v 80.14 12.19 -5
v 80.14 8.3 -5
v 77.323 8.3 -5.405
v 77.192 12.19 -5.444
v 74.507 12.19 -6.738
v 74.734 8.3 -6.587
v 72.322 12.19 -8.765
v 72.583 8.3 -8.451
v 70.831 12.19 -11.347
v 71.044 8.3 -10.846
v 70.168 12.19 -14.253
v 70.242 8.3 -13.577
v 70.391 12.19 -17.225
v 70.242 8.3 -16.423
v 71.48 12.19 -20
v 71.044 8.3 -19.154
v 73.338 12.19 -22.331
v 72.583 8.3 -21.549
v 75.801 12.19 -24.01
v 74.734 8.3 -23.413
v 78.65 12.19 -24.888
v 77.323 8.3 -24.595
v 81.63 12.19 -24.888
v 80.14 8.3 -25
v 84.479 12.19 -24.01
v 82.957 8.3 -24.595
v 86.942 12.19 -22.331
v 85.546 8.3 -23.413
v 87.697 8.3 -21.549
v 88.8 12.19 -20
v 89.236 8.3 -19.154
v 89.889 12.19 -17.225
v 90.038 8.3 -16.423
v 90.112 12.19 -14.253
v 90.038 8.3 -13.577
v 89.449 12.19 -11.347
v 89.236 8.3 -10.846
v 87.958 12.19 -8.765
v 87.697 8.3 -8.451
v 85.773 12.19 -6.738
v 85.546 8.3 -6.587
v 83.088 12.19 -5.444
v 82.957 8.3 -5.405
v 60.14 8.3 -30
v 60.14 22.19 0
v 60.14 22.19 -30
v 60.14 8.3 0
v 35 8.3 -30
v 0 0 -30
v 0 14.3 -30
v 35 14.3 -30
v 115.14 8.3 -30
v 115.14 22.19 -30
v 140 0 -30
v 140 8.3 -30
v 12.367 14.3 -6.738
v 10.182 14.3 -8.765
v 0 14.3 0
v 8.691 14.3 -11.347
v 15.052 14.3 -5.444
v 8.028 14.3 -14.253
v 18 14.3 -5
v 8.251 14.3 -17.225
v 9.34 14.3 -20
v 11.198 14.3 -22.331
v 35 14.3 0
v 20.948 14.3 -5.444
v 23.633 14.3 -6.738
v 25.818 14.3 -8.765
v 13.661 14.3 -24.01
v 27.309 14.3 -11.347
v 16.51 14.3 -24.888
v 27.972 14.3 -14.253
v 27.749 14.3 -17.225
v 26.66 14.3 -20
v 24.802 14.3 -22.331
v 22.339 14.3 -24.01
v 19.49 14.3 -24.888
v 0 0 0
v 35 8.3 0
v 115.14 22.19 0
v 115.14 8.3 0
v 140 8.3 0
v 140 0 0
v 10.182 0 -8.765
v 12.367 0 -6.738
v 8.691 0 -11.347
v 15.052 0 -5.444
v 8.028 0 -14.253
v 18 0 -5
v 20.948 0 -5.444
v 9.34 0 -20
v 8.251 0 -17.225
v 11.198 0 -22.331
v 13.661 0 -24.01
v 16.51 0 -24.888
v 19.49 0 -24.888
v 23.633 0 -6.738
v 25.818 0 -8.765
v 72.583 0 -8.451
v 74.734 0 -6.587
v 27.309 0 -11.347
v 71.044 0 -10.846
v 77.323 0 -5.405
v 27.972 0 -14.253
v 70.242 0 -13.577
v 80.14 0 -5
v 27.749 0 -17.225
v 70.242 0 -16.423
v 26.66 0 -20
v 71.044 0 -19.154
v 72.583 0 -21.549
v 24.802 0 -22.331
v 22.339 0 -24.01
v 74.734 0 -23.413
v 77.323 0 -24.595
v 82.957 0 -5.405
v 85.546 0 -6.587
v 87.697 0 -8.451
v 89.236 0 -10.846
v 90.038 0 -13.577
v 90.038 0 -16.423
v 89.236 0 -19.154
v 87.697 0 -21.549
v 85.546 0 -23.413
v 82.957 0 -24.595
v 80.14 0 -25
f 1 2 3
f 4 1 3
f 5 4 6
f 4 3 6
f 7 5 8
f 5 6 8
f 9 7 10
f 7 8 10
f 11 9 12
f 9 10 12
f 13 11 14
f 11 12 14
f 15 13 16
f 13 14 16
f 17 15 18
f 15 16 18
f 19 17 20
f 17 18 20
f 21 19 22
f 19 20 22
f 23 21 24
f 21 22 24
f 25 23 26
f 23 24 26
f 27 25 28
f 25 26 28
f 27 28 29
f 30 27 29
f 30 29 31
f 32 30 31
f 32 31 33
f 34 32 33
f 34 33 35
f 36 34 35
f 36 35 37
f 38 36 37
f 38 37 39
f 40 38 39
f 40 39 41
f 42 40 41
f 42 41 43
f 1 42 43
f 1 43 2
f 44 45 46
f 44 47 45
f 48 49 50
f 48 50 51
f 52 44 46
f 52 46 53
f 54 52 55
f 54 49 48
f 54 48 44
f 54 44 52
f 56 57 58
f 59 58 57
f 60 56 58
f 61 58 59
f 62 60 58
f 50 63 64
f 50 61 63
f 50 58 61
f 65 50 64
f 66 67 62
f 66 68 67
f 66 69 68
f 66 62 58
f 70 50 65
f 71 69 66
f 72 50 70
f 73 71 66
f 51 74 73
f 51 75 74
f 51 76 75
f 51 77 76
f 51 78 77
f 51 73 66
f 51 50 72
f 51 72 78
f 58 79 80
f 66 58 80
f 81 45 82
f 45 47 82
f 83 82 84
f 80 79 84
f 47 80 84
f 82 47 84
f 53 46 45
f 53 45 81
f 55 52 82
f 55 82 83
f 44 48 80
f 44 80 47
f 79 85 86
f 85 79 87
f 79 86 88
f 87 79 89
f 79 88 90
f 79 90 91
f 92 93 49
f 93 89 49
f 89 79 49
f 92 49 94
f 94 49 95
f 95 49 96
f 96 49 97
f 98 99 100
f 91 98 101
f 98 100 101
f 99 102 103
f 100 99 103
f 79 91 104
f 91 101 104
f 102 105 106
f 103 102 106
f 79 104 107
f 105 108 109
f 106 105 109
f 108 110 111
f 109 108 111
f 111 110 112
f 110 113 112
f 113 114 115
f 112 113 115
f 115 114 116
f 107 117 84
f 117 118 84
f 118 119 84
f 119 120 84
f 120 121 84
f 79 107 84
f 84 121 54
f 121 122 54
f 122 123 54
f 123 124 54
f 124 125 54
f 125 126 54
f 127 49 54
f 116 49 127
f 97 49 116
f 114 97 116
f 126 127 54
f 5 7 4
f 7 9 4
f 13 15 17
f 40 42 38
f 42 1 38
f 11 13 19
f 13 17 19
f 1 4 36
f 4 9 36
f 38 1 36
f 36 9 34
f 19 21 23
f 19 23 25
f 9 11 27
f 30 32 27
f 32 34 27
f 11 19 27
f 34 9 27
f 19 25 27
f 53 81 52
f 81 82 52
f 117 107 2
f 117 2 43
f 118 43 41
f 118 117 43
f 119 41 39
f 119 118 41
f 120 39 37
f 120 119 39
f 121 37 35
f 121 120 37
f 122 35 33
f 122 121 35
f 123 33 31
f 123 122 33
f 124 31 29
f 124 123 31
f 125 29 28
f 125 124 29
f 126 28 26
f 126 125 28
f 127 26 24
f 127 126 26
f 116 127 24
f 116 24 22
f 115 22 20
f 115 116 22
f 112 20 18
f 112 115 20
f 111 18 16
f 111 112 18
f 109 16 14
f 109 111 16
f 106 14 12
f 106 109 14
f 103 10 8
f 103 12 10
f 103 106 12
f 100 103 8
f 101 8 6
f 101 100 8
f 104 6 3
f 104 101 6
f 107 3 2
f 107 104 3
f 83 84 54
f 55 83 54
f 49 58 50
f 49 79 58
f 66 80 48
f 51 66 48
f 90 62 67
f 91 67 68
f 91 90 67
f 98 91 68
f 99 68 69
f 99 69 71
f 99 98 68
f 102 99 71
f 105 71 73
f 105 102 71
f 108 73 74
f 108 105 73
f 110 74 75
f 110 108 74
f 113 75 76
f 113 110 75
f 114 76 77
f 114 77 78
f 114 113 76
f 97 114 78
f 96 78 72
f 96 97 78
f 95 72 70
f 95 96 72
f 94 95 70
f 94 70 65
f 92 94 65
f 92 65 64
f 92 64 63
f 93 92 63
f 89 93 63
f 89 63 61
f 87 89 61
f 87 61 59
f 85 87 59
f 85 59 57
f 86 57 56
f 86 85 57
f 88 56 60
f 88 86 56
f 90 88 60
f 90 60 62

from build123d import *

# Parameters (mm, degrees)
SKETCH1_W               = 140
SKETCH1_H               = 30
BOSS_EXTRUDE1_DEPTH     = 8.3
SKETCH3_W               = 35
SKETCH3_H               = 30
BOSS_EXTRUDE2_DEPTH     = 6
CUT_EXTRUDE1_DEPTH      = 6
CUT_EXTRUDE1_DEPTH_BACK = 8.3
SKETCH2_R               = 10
SKETCH4_W               = 55
SKETCH4_H               = 30
BOSS_EXTRUDE3_DEPTH     = 3.89
SKETCH5_R               = 10
CUT_EXTRUDE2_DEPTH      = 144.890548682
SKETCH7_W               = 55
SKETCH7_H               = 30
BOSS_EXTRUDE4_DEPTH     = 10


with BuildPart() as part:
    # Sketch1 → Boss-Extrude1 (new body)
    with BuildSketch(Plane(origin=(0, 0, 0), x_dir=(1, 0, 0), z_dir=(0, 1, 0))):
        with Locations((70, 15)):
            Rectangle(SKETCH1_W, SKETCH1_H)
    extrude(amount=BOSS_EXTRUDE1_DEPTH)

    # Sketch3 → Boss-Extrude2 (add)
    with BuildSketch(Plane(origin=(0, 8.3, 0), x_dir=(1, 0, 0), z_dir=(0, 1, 0))):
        with Locations((17.5, 15)):
            Rectangle(SKETCH3_W, SKETCH3_H)
    extrude(amount=BOSS_EXTRUDE2_DEPTH)

    # Sketch2 → Cut-Extrude1 (cut, two sides: drawn at the far end of the back side and taken through both)
    with BuildSketch(Plane(origin=(0, 8.3, 0), x_dir=(1, 0, 0), z_dir=(0, 1, 0)).offset(-CUT_EXTRUDE1_DEPTH_BACK)):
        with Locations(Location((18, 15, 0), (0, 0, 270))):
            Circle(SKETCH2_R)
        with Locations(Location((80.14, 15, 0), (0, 0, 90))):
            Circle(SKETCH2_R)
    extrude(amount=CUT_EXTRUDE1_DEPTH + CUT_EXTRUDE1_DEPTH_BACK, mode=Mode.SUBTRACT)

    # Sketch4 → Boss-Extrude3 (add)
    with BuildSketch(Plane(origin=(0, 8.3, 0), x_dir=(1, 0, 0), z_dir=(0, 1, 0))):
        with Locations((87.64, 15)):
            Rectangle(SKETCH4_W, SKETCH4_H)
    extrude(amount=BOSS_EXTRUDE3_DEPTH)

    # Sketch5 → Cut-Extrude2 (cut, through all)
    with BuildSketch(Plane.XZ):
        with Locations(Location((80.14, -15, 0), (0, 0, 90))):
            Circle(SKETCH5_R)
    extrude(amount=-CUT_EXTRUDE2_DEPTH, mode=Mode.SUBTRACT)

    # Sketch7 → Boss-Extrude4 (add)
    with BuildSketch(Plane(origin=(0, 12.19, 0), x_dir=(1, 0, 0), z_dir=(0, 1, 0))):
        with Locations((87.64, 15)):
            Rectangle(SKETCH7_W, SKETCH7_H)
    extrude(amount=BOSS_EXTRUDE4_DEPTH)


solid = part.part
